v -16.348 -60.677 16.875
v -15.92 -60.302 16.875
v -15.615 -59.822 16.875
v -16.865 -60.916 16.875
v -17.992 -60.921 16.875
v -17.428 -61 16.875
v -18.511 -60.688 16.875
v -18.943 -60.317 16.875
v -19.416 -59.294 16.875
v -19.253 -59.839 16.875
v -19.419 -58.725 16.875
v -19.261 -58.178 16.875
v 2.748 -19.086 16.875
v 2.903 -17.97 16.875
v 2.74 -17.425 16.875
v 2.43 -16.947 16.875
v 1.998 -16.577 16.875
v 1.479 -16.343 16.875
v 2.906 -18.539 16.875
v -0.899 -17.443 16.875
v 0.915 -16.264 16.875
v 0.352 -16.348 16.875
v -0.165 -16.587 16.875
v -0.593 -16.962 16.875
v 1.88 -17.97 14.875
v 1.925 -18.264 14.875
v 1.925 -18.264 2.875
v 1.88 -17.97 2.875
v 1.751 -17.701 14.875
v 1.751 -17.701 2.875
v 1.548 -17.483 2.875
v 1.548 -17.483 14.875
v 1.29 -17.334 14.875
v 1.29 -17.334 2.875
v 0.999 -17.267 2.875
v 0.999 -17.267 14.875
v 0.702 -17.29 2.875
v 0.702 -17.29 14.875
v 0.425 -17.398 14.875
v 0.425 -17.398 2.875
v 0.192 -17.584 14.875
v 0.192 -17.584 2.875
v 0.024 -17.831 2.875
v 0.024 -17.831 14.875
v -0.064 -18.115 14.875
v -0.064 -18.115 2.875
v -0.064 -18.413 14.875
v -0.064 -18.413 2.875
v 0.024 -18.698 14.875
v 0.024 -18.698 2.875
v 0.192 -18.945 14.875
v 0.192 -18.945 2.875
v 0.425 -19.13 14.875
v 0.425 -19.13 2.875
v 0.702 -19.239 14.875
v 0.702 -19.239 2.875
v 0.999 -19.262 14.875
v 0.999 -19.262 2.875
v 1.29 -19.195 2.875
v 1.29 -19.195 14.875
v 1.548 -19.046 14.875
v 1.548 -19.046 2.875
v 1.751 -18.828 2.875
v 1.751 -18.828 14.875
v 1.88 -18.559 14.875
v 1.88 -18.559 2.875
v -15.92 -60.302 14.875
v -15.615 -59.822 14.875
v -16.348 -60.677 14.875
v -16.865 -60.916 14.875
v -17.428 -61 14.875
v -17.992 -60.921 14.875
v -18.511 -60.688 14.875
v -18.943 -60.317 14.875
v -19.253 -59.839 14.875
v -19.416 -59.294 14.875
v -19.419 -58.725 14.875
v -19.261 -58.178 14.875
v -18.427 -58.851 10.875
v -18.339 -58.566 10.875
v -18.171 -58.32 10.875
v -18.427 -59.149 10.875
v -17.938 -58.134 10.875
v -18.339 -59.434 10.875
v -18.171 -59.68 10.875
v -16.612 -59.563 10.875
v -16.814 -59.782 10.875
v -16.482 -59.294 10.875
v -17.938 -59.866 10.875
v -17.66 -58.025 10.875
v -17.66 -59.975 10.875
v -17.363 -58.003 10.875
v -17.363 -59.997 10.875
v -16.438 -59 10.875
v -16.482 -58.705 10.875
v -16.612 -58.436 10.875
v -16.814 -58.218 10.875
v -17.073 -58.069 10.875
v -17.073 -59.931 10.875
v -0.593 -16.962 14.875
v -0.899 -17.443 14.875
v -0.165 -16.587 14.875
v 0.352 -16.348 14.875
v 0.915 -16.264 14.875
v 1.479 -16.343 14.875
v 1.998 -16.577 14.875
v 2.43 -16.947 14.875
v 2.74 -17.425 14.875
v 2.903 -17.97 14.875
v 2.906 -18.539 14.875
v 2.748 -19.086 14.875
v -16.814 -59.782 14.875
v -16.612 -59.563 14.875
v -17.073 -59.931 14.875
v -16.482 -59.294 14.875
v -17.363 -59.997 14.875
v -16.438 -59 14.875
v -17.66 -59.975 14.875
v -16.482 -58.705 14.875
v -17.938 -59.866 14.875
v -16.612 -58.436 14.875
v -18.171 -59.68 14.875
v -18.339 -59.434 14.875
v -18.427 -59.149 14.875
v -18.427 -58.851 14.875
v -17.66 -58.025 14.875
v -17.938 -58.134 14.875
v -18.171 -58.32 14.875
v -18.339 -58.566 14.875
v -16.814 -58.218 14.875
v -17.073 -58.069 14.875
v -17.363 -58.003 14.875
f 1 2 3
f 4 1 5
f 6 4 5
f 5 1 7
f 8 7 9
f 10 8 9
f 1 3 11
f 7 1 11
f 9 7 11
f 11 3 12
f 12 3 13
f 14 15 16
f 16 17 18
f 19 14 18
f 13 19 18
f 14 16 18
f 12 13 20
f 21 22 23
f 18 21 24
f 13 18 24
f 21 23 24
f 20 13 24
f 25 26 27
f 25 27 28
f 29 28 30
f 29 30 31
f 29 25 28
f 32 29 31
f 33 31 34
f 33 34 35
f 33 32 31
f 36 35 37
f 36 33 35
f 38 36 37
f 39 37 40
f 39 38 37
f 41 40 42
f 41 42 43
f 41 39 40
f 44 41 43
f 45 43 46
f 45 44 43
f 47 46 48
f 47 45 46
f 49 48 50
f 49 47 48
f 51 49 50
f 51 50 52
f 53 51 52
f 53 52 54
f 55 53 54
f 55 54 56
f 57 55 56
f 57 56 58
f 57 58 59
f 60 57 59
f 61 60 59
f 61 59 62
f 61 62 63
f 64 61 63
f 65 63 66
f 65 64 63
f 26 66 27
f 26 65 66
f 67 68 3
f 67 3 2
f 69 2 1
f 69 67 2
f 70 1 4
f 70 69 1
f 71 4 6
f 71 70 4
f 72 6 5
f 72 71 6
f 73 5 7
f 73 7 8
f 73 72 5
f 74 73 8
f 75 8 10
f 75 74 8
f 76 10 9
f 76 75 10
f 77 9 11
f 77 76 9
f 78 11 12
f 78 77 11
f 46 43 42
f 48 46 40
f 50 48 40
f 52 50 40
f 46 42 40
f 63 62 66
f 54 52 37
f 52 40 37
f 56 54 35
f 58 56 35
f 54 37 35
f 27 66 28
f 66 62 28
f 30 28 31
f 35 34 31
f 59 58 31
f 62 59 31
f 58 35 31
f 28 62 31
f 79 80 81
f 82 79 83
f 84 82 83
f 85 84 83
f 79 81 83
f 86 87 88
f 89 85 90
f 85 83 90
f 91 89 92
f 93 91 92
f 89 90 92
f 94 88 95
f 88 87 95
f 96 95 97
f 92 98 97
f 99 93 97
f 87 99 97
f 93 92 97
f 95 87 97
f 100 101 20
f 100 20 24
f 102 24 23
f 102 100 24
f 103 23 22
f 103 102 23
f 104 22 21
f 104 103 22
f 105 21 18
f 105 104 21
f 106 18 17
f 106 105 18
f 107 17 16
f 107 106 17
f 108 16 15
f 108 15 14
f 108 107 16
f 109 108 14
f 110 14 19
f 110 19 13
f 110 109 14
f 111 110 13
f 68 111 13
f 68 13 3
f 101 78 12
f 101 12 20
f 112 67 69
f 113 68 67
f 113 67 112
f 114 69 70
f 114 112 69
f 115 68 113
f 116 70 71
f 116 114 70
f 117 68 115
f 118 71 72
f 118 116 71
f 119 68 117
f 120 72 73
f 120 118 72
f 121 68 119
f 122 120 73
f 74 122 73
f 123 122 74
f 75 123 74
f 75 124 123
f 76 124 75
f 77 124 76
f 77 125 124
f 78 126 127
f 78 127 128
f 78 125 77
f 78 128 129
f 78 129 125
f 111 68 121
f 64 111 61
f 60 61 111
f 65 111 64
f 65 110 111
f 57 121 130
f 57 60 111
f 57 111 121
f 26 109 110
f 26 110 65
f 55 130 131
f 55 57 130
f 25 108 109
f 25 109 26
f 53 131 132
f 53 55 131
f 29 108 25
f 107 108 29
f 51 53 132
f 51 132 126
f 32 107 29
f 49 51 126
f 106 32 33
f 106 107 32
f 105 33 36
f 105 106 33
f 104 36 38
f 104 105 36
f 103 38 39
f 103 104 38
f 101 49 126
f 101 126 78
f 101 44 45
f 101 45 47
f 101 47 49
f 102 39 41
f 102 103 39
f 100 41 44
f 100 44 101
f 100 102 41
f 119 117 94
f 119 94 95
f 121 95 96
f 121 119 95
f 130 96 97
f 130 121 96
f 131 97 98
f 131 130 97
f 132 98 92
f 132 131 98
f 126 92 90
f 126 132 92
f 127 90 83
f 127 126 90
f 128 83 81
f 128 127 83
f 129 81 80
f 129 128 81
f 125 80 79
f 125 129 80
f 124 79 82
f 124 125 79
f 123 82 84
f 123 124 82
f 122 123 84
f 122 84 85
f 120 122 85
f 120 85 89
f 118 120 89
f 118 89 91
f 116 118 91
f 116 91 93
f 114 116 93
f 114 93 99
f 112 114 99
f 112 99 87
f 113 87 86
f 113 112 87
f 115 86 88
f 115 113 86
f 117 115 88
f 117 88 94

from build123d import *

# Parameters (mm, degrees)
BOSS_EXTRUDE1_DEPTH = 2
SKETCH1_3_R         = 1
BOSS_EXTRUDE2_DEPTH = 4
SKETCH1_4_R         = 1
BOSS_EXTRUDE3_DEPTH = 12


with BuildPart() as part:
    # Sketch1 → Boss-Extrude1 (new body)
    with BuildSketch(Plane.XY.offset(14.87534902)):
        with BuildLine():
            Line((2.748026099, -19.086356488), (-15.614663255, -59.821649221))
            ThreePointArc((-15.614663255, -59.821649221), (-18.259886239, -60.823045928), (-19.261282946, -58.177822944))
            Line((-19.261282946, -58.177822944), (-0.898593592, -17.442530211))
            ThreePointArc((-0.898593592, -17.442530211), (1.746629392, -16.441133504), (2.748026099, -19.086356488))
        make_face()
    extrude(amount=BOSS_EXTRUDE1_DEPTH)

    # Sketch1<3> → Boss-Extrude2 (add)
    with BuildSketch(Plane.XY.offset(14.87534902)):
        with Locations((-17.4379731, -58.999736083)):
            Circle(SKETCH1_3_R)
    extrude(amount=-BOSS_EXTRUDE2_DEPTH)

    # Sketch1<4> → Boss-Extrude3 (add)
    with BuildSketch(Plane.XY.offset(14.87534902)):
        with Locations((0.924716254, -18.26444335)):
            Circle(SKETCH1_4_R)
    extrude(amount=-BOSS_EXTRUDE3_DEPTH)


solid = part.part
